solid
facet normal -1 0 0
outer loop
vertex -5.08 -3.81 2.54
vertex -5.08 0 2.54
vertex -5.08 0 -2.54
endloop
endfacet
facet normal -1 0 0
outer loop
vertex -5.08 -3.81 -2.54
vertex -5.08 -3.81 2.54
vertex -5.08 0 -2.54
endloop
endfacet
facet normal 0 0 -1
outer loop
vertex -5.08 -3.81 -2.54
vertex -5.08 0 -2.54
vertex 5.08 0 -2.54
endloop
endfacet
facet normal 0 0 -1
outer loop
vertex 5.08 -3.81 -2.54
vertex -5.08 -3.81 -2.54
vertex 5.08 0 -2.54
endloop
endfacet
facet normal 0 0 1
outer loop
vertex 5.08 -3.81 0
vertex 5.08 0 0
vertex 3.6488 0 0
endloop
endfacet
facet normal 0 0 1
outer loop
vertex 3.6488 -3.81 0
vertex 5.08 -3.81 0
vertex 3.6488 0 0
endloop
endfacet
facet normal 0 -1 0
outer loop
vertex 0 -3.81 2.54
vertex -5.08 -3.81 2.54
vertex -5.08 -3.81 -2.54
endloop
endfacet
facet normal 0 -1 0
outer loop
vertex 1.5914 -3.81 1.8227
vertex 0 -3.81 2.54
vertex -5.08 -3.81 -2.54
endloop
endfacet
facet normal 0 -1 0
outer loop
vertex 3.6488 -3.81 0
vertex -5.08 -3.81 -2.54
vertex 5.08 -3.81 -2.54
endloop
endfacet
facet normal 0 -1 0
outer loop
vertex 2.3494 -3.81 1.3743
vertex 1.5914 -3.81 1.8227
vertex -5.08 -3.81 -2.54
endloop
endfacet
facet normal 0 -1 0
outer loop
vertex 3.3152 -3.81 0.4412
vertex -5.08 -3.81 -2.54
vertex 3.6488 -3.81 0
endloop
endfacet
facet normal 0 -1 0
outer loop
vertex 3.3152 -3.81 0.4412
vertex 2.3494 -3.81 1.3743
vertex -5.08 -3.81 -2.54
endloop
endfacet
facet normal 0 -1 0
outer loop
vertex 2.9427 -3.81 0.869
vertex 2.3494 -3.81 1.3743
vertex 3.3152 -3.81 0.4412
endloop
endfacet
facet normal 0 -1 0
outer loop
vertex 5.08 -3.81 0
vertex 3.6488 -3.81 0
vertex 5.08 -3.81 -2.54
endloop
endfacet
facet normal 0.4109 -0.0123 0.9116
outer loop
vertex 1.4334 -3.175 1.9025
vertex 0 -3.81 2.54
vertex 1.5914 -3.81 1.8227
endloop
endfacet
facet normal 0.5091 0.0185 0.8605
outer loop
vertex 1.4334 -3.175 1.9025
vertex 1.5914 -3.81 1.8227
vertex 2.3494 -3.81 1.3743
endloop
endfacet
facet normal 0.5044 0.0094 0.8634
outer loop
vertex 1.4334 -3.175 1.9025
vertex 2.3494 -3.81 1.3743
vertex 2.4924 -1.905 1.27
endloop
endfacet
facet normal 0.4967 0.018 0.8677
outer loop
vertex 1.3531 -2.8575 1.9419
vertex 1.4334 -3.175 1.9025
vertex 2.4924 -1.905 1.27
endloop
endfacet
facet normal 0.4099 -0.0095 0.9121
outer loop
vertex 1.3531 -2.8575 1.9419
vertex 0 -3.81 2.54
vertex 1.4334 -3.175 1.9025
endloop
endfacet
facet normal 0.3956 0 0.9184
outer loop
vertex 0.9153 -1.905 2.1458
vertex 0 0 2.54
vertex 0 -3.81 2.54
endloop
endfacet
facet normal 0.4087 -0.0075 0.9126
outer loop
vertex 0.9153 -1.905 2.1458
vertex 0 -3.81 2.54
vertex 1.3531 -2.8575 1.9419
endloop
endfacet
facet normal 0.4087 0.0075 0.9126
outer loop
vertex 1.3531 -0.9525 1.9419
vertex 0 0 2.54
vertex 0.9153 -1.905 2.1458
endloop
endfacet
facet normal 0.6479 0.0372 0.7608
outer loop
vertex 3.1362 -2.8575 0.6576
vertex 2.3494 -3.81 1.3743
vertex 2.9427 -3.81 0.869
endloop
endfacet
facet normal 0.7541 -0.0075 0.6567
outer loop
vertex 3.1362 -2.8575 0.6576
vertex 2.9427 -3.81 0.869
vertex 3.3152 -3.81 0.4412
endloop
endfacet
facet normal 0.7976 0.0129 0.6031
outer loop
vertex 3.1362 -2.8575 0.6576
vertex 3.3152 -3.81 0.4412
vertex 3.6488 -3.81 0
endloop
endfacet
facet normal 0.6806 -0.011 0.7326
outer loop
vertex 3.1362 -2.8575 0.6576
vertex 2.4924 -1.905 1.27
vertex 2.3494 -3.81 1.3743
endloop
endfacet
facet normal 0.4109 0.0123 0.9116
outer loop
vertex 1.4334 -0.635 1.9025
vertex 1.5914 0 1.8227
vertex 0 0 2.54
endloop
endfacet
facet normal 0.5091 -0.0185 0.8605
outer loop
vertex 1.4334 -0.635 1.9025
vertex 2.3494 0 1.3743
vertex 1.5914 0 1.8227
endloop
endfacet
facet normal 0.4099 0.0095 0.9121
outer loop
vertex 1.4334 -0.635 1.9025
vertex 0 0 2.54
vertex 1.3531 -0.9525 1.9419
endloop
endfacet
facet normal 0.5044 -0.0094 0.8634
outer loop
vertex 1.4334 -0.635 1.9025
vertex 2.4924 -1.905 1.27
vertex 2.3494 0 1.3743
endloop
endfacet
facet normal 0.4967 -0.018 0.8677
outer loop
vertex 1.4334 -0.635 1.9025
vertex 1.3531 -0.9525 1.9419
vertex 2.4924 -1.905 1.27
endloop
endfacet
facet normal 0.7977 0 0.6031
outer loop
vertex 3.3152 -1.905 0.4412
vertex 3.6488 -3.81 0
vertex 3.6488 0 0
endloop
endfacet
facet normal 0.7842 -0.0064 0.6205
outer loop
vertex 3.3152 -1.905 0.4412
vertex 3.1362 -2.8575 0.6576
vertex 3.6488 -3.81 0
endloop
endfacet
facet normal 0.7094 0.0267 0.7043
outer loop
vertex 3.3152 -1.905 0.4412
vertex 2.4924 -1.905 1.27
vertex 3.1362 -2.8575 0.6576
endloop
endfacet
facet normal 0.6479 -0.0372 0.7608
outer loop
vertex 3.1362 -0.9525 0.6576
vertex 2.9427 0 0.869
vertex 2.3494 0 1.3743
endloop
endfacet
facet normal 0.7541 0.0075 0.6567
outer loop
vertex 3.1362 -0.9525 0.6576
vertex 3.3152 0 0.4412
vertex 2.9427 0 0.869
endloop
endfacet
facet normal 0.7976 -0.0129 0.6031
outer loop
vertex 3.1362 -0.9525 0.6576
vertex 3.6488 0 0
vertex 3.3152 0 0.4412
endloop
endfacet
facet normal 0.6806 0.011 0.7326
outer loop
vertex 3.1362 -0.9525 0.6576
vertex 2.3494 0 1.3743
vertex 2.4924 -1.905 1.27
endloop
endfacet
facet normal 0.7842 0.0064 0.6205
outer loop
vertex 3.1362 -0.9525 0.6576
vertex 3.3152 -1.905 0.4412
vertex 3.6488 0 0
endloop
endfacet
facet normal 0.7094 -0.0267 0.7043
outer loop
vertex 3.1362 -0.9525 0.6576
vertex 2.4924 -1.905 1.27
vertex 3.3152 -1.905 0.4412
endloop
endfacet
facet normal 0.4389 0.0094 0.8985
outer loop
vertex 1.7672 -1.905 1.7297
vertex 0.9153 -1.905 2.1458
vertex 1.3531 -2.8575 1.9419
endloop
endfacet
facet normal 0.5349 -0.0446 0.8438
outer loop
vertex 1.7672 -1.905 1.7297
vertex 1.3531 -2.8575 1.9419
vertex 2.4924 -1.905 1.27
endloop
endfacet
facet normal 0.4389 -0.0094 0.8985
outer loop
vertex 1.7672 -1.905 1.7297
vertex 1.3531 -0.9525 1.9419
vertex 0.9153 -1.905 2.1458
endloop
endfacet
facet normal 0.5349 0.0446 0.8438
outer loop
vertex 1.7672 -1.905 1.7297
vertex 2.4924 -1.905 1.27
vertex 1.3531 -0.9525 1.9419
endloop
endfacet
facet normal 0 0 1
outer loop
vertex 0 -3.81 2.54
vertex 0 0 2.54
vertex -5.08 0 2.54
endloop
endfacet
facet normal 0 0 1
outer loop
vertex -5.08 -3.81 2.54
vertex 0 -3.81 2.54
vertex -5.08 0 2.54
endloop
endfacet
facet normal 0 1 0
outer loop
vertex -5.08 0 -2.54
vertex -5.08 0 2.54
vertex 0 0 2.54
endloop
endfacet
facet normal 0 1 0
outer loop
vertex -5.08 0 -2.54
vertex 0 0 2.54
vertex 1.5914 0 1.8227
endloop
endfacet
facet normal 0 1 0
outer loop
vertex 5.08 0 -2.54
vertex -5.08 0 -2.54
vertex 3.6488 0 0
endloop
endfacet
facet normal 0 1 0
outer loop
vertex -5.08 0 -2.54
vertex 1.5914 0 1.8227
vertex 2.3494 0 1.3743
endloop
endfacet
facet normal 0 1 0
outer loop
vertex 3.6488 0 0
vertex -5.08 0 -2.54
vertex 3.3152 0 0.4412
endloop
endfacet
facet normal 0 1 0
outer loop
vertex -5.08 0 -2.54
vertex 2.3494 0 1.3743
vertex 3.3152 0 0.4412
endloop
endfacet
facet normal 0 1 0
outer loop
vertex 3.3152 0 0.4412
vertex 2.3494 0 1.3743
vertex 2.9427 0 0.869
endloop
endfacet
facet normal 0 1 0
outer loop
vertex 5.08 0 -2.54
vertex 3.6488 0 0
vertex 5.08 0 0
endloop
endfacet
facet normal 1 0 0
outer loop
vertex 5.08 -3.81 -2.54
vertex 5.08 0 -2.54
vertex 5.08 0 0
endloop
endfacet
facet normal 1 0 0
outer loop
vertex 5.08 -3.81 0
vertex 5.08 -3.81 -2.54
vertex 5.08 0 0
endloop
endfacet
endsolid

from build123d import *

# Parameters (mm, degrees)
F1_DEPTH = 3.81


with BuildPart() as f1:
    # F0 (on Front) → F1 (new body)
    with BuildSketch(Plane.XZ):
        with BuildLine():
            Line((-5.08, 0), (-5.08, -2.54))
            Line((-5.08, -2.54), (5.08, -2.54))
            Line((5.08, -2.54), (5.08, 0))
            Line((5.08, 0), (3.6488212645, 0))
            add(Edge.make_bspline(
                [(0, 2.54), (0.9258067301, 2.1494416055), (2.5770675473, 1.4528449754), (3.3216856434, 0.4434575874), (3.6488212645, 0)],
                knots=[0, 0, 0, 0, 0.5606665022, 1, 1, 1, 1], degree=3))
            Line((0, 2.54), (-5.08, 2.54))
            Line((-5.08, 2.54), (-5.08, 0))
        make_face()
    extrude(amount=F1_DEPTH)


solid = f1.part
